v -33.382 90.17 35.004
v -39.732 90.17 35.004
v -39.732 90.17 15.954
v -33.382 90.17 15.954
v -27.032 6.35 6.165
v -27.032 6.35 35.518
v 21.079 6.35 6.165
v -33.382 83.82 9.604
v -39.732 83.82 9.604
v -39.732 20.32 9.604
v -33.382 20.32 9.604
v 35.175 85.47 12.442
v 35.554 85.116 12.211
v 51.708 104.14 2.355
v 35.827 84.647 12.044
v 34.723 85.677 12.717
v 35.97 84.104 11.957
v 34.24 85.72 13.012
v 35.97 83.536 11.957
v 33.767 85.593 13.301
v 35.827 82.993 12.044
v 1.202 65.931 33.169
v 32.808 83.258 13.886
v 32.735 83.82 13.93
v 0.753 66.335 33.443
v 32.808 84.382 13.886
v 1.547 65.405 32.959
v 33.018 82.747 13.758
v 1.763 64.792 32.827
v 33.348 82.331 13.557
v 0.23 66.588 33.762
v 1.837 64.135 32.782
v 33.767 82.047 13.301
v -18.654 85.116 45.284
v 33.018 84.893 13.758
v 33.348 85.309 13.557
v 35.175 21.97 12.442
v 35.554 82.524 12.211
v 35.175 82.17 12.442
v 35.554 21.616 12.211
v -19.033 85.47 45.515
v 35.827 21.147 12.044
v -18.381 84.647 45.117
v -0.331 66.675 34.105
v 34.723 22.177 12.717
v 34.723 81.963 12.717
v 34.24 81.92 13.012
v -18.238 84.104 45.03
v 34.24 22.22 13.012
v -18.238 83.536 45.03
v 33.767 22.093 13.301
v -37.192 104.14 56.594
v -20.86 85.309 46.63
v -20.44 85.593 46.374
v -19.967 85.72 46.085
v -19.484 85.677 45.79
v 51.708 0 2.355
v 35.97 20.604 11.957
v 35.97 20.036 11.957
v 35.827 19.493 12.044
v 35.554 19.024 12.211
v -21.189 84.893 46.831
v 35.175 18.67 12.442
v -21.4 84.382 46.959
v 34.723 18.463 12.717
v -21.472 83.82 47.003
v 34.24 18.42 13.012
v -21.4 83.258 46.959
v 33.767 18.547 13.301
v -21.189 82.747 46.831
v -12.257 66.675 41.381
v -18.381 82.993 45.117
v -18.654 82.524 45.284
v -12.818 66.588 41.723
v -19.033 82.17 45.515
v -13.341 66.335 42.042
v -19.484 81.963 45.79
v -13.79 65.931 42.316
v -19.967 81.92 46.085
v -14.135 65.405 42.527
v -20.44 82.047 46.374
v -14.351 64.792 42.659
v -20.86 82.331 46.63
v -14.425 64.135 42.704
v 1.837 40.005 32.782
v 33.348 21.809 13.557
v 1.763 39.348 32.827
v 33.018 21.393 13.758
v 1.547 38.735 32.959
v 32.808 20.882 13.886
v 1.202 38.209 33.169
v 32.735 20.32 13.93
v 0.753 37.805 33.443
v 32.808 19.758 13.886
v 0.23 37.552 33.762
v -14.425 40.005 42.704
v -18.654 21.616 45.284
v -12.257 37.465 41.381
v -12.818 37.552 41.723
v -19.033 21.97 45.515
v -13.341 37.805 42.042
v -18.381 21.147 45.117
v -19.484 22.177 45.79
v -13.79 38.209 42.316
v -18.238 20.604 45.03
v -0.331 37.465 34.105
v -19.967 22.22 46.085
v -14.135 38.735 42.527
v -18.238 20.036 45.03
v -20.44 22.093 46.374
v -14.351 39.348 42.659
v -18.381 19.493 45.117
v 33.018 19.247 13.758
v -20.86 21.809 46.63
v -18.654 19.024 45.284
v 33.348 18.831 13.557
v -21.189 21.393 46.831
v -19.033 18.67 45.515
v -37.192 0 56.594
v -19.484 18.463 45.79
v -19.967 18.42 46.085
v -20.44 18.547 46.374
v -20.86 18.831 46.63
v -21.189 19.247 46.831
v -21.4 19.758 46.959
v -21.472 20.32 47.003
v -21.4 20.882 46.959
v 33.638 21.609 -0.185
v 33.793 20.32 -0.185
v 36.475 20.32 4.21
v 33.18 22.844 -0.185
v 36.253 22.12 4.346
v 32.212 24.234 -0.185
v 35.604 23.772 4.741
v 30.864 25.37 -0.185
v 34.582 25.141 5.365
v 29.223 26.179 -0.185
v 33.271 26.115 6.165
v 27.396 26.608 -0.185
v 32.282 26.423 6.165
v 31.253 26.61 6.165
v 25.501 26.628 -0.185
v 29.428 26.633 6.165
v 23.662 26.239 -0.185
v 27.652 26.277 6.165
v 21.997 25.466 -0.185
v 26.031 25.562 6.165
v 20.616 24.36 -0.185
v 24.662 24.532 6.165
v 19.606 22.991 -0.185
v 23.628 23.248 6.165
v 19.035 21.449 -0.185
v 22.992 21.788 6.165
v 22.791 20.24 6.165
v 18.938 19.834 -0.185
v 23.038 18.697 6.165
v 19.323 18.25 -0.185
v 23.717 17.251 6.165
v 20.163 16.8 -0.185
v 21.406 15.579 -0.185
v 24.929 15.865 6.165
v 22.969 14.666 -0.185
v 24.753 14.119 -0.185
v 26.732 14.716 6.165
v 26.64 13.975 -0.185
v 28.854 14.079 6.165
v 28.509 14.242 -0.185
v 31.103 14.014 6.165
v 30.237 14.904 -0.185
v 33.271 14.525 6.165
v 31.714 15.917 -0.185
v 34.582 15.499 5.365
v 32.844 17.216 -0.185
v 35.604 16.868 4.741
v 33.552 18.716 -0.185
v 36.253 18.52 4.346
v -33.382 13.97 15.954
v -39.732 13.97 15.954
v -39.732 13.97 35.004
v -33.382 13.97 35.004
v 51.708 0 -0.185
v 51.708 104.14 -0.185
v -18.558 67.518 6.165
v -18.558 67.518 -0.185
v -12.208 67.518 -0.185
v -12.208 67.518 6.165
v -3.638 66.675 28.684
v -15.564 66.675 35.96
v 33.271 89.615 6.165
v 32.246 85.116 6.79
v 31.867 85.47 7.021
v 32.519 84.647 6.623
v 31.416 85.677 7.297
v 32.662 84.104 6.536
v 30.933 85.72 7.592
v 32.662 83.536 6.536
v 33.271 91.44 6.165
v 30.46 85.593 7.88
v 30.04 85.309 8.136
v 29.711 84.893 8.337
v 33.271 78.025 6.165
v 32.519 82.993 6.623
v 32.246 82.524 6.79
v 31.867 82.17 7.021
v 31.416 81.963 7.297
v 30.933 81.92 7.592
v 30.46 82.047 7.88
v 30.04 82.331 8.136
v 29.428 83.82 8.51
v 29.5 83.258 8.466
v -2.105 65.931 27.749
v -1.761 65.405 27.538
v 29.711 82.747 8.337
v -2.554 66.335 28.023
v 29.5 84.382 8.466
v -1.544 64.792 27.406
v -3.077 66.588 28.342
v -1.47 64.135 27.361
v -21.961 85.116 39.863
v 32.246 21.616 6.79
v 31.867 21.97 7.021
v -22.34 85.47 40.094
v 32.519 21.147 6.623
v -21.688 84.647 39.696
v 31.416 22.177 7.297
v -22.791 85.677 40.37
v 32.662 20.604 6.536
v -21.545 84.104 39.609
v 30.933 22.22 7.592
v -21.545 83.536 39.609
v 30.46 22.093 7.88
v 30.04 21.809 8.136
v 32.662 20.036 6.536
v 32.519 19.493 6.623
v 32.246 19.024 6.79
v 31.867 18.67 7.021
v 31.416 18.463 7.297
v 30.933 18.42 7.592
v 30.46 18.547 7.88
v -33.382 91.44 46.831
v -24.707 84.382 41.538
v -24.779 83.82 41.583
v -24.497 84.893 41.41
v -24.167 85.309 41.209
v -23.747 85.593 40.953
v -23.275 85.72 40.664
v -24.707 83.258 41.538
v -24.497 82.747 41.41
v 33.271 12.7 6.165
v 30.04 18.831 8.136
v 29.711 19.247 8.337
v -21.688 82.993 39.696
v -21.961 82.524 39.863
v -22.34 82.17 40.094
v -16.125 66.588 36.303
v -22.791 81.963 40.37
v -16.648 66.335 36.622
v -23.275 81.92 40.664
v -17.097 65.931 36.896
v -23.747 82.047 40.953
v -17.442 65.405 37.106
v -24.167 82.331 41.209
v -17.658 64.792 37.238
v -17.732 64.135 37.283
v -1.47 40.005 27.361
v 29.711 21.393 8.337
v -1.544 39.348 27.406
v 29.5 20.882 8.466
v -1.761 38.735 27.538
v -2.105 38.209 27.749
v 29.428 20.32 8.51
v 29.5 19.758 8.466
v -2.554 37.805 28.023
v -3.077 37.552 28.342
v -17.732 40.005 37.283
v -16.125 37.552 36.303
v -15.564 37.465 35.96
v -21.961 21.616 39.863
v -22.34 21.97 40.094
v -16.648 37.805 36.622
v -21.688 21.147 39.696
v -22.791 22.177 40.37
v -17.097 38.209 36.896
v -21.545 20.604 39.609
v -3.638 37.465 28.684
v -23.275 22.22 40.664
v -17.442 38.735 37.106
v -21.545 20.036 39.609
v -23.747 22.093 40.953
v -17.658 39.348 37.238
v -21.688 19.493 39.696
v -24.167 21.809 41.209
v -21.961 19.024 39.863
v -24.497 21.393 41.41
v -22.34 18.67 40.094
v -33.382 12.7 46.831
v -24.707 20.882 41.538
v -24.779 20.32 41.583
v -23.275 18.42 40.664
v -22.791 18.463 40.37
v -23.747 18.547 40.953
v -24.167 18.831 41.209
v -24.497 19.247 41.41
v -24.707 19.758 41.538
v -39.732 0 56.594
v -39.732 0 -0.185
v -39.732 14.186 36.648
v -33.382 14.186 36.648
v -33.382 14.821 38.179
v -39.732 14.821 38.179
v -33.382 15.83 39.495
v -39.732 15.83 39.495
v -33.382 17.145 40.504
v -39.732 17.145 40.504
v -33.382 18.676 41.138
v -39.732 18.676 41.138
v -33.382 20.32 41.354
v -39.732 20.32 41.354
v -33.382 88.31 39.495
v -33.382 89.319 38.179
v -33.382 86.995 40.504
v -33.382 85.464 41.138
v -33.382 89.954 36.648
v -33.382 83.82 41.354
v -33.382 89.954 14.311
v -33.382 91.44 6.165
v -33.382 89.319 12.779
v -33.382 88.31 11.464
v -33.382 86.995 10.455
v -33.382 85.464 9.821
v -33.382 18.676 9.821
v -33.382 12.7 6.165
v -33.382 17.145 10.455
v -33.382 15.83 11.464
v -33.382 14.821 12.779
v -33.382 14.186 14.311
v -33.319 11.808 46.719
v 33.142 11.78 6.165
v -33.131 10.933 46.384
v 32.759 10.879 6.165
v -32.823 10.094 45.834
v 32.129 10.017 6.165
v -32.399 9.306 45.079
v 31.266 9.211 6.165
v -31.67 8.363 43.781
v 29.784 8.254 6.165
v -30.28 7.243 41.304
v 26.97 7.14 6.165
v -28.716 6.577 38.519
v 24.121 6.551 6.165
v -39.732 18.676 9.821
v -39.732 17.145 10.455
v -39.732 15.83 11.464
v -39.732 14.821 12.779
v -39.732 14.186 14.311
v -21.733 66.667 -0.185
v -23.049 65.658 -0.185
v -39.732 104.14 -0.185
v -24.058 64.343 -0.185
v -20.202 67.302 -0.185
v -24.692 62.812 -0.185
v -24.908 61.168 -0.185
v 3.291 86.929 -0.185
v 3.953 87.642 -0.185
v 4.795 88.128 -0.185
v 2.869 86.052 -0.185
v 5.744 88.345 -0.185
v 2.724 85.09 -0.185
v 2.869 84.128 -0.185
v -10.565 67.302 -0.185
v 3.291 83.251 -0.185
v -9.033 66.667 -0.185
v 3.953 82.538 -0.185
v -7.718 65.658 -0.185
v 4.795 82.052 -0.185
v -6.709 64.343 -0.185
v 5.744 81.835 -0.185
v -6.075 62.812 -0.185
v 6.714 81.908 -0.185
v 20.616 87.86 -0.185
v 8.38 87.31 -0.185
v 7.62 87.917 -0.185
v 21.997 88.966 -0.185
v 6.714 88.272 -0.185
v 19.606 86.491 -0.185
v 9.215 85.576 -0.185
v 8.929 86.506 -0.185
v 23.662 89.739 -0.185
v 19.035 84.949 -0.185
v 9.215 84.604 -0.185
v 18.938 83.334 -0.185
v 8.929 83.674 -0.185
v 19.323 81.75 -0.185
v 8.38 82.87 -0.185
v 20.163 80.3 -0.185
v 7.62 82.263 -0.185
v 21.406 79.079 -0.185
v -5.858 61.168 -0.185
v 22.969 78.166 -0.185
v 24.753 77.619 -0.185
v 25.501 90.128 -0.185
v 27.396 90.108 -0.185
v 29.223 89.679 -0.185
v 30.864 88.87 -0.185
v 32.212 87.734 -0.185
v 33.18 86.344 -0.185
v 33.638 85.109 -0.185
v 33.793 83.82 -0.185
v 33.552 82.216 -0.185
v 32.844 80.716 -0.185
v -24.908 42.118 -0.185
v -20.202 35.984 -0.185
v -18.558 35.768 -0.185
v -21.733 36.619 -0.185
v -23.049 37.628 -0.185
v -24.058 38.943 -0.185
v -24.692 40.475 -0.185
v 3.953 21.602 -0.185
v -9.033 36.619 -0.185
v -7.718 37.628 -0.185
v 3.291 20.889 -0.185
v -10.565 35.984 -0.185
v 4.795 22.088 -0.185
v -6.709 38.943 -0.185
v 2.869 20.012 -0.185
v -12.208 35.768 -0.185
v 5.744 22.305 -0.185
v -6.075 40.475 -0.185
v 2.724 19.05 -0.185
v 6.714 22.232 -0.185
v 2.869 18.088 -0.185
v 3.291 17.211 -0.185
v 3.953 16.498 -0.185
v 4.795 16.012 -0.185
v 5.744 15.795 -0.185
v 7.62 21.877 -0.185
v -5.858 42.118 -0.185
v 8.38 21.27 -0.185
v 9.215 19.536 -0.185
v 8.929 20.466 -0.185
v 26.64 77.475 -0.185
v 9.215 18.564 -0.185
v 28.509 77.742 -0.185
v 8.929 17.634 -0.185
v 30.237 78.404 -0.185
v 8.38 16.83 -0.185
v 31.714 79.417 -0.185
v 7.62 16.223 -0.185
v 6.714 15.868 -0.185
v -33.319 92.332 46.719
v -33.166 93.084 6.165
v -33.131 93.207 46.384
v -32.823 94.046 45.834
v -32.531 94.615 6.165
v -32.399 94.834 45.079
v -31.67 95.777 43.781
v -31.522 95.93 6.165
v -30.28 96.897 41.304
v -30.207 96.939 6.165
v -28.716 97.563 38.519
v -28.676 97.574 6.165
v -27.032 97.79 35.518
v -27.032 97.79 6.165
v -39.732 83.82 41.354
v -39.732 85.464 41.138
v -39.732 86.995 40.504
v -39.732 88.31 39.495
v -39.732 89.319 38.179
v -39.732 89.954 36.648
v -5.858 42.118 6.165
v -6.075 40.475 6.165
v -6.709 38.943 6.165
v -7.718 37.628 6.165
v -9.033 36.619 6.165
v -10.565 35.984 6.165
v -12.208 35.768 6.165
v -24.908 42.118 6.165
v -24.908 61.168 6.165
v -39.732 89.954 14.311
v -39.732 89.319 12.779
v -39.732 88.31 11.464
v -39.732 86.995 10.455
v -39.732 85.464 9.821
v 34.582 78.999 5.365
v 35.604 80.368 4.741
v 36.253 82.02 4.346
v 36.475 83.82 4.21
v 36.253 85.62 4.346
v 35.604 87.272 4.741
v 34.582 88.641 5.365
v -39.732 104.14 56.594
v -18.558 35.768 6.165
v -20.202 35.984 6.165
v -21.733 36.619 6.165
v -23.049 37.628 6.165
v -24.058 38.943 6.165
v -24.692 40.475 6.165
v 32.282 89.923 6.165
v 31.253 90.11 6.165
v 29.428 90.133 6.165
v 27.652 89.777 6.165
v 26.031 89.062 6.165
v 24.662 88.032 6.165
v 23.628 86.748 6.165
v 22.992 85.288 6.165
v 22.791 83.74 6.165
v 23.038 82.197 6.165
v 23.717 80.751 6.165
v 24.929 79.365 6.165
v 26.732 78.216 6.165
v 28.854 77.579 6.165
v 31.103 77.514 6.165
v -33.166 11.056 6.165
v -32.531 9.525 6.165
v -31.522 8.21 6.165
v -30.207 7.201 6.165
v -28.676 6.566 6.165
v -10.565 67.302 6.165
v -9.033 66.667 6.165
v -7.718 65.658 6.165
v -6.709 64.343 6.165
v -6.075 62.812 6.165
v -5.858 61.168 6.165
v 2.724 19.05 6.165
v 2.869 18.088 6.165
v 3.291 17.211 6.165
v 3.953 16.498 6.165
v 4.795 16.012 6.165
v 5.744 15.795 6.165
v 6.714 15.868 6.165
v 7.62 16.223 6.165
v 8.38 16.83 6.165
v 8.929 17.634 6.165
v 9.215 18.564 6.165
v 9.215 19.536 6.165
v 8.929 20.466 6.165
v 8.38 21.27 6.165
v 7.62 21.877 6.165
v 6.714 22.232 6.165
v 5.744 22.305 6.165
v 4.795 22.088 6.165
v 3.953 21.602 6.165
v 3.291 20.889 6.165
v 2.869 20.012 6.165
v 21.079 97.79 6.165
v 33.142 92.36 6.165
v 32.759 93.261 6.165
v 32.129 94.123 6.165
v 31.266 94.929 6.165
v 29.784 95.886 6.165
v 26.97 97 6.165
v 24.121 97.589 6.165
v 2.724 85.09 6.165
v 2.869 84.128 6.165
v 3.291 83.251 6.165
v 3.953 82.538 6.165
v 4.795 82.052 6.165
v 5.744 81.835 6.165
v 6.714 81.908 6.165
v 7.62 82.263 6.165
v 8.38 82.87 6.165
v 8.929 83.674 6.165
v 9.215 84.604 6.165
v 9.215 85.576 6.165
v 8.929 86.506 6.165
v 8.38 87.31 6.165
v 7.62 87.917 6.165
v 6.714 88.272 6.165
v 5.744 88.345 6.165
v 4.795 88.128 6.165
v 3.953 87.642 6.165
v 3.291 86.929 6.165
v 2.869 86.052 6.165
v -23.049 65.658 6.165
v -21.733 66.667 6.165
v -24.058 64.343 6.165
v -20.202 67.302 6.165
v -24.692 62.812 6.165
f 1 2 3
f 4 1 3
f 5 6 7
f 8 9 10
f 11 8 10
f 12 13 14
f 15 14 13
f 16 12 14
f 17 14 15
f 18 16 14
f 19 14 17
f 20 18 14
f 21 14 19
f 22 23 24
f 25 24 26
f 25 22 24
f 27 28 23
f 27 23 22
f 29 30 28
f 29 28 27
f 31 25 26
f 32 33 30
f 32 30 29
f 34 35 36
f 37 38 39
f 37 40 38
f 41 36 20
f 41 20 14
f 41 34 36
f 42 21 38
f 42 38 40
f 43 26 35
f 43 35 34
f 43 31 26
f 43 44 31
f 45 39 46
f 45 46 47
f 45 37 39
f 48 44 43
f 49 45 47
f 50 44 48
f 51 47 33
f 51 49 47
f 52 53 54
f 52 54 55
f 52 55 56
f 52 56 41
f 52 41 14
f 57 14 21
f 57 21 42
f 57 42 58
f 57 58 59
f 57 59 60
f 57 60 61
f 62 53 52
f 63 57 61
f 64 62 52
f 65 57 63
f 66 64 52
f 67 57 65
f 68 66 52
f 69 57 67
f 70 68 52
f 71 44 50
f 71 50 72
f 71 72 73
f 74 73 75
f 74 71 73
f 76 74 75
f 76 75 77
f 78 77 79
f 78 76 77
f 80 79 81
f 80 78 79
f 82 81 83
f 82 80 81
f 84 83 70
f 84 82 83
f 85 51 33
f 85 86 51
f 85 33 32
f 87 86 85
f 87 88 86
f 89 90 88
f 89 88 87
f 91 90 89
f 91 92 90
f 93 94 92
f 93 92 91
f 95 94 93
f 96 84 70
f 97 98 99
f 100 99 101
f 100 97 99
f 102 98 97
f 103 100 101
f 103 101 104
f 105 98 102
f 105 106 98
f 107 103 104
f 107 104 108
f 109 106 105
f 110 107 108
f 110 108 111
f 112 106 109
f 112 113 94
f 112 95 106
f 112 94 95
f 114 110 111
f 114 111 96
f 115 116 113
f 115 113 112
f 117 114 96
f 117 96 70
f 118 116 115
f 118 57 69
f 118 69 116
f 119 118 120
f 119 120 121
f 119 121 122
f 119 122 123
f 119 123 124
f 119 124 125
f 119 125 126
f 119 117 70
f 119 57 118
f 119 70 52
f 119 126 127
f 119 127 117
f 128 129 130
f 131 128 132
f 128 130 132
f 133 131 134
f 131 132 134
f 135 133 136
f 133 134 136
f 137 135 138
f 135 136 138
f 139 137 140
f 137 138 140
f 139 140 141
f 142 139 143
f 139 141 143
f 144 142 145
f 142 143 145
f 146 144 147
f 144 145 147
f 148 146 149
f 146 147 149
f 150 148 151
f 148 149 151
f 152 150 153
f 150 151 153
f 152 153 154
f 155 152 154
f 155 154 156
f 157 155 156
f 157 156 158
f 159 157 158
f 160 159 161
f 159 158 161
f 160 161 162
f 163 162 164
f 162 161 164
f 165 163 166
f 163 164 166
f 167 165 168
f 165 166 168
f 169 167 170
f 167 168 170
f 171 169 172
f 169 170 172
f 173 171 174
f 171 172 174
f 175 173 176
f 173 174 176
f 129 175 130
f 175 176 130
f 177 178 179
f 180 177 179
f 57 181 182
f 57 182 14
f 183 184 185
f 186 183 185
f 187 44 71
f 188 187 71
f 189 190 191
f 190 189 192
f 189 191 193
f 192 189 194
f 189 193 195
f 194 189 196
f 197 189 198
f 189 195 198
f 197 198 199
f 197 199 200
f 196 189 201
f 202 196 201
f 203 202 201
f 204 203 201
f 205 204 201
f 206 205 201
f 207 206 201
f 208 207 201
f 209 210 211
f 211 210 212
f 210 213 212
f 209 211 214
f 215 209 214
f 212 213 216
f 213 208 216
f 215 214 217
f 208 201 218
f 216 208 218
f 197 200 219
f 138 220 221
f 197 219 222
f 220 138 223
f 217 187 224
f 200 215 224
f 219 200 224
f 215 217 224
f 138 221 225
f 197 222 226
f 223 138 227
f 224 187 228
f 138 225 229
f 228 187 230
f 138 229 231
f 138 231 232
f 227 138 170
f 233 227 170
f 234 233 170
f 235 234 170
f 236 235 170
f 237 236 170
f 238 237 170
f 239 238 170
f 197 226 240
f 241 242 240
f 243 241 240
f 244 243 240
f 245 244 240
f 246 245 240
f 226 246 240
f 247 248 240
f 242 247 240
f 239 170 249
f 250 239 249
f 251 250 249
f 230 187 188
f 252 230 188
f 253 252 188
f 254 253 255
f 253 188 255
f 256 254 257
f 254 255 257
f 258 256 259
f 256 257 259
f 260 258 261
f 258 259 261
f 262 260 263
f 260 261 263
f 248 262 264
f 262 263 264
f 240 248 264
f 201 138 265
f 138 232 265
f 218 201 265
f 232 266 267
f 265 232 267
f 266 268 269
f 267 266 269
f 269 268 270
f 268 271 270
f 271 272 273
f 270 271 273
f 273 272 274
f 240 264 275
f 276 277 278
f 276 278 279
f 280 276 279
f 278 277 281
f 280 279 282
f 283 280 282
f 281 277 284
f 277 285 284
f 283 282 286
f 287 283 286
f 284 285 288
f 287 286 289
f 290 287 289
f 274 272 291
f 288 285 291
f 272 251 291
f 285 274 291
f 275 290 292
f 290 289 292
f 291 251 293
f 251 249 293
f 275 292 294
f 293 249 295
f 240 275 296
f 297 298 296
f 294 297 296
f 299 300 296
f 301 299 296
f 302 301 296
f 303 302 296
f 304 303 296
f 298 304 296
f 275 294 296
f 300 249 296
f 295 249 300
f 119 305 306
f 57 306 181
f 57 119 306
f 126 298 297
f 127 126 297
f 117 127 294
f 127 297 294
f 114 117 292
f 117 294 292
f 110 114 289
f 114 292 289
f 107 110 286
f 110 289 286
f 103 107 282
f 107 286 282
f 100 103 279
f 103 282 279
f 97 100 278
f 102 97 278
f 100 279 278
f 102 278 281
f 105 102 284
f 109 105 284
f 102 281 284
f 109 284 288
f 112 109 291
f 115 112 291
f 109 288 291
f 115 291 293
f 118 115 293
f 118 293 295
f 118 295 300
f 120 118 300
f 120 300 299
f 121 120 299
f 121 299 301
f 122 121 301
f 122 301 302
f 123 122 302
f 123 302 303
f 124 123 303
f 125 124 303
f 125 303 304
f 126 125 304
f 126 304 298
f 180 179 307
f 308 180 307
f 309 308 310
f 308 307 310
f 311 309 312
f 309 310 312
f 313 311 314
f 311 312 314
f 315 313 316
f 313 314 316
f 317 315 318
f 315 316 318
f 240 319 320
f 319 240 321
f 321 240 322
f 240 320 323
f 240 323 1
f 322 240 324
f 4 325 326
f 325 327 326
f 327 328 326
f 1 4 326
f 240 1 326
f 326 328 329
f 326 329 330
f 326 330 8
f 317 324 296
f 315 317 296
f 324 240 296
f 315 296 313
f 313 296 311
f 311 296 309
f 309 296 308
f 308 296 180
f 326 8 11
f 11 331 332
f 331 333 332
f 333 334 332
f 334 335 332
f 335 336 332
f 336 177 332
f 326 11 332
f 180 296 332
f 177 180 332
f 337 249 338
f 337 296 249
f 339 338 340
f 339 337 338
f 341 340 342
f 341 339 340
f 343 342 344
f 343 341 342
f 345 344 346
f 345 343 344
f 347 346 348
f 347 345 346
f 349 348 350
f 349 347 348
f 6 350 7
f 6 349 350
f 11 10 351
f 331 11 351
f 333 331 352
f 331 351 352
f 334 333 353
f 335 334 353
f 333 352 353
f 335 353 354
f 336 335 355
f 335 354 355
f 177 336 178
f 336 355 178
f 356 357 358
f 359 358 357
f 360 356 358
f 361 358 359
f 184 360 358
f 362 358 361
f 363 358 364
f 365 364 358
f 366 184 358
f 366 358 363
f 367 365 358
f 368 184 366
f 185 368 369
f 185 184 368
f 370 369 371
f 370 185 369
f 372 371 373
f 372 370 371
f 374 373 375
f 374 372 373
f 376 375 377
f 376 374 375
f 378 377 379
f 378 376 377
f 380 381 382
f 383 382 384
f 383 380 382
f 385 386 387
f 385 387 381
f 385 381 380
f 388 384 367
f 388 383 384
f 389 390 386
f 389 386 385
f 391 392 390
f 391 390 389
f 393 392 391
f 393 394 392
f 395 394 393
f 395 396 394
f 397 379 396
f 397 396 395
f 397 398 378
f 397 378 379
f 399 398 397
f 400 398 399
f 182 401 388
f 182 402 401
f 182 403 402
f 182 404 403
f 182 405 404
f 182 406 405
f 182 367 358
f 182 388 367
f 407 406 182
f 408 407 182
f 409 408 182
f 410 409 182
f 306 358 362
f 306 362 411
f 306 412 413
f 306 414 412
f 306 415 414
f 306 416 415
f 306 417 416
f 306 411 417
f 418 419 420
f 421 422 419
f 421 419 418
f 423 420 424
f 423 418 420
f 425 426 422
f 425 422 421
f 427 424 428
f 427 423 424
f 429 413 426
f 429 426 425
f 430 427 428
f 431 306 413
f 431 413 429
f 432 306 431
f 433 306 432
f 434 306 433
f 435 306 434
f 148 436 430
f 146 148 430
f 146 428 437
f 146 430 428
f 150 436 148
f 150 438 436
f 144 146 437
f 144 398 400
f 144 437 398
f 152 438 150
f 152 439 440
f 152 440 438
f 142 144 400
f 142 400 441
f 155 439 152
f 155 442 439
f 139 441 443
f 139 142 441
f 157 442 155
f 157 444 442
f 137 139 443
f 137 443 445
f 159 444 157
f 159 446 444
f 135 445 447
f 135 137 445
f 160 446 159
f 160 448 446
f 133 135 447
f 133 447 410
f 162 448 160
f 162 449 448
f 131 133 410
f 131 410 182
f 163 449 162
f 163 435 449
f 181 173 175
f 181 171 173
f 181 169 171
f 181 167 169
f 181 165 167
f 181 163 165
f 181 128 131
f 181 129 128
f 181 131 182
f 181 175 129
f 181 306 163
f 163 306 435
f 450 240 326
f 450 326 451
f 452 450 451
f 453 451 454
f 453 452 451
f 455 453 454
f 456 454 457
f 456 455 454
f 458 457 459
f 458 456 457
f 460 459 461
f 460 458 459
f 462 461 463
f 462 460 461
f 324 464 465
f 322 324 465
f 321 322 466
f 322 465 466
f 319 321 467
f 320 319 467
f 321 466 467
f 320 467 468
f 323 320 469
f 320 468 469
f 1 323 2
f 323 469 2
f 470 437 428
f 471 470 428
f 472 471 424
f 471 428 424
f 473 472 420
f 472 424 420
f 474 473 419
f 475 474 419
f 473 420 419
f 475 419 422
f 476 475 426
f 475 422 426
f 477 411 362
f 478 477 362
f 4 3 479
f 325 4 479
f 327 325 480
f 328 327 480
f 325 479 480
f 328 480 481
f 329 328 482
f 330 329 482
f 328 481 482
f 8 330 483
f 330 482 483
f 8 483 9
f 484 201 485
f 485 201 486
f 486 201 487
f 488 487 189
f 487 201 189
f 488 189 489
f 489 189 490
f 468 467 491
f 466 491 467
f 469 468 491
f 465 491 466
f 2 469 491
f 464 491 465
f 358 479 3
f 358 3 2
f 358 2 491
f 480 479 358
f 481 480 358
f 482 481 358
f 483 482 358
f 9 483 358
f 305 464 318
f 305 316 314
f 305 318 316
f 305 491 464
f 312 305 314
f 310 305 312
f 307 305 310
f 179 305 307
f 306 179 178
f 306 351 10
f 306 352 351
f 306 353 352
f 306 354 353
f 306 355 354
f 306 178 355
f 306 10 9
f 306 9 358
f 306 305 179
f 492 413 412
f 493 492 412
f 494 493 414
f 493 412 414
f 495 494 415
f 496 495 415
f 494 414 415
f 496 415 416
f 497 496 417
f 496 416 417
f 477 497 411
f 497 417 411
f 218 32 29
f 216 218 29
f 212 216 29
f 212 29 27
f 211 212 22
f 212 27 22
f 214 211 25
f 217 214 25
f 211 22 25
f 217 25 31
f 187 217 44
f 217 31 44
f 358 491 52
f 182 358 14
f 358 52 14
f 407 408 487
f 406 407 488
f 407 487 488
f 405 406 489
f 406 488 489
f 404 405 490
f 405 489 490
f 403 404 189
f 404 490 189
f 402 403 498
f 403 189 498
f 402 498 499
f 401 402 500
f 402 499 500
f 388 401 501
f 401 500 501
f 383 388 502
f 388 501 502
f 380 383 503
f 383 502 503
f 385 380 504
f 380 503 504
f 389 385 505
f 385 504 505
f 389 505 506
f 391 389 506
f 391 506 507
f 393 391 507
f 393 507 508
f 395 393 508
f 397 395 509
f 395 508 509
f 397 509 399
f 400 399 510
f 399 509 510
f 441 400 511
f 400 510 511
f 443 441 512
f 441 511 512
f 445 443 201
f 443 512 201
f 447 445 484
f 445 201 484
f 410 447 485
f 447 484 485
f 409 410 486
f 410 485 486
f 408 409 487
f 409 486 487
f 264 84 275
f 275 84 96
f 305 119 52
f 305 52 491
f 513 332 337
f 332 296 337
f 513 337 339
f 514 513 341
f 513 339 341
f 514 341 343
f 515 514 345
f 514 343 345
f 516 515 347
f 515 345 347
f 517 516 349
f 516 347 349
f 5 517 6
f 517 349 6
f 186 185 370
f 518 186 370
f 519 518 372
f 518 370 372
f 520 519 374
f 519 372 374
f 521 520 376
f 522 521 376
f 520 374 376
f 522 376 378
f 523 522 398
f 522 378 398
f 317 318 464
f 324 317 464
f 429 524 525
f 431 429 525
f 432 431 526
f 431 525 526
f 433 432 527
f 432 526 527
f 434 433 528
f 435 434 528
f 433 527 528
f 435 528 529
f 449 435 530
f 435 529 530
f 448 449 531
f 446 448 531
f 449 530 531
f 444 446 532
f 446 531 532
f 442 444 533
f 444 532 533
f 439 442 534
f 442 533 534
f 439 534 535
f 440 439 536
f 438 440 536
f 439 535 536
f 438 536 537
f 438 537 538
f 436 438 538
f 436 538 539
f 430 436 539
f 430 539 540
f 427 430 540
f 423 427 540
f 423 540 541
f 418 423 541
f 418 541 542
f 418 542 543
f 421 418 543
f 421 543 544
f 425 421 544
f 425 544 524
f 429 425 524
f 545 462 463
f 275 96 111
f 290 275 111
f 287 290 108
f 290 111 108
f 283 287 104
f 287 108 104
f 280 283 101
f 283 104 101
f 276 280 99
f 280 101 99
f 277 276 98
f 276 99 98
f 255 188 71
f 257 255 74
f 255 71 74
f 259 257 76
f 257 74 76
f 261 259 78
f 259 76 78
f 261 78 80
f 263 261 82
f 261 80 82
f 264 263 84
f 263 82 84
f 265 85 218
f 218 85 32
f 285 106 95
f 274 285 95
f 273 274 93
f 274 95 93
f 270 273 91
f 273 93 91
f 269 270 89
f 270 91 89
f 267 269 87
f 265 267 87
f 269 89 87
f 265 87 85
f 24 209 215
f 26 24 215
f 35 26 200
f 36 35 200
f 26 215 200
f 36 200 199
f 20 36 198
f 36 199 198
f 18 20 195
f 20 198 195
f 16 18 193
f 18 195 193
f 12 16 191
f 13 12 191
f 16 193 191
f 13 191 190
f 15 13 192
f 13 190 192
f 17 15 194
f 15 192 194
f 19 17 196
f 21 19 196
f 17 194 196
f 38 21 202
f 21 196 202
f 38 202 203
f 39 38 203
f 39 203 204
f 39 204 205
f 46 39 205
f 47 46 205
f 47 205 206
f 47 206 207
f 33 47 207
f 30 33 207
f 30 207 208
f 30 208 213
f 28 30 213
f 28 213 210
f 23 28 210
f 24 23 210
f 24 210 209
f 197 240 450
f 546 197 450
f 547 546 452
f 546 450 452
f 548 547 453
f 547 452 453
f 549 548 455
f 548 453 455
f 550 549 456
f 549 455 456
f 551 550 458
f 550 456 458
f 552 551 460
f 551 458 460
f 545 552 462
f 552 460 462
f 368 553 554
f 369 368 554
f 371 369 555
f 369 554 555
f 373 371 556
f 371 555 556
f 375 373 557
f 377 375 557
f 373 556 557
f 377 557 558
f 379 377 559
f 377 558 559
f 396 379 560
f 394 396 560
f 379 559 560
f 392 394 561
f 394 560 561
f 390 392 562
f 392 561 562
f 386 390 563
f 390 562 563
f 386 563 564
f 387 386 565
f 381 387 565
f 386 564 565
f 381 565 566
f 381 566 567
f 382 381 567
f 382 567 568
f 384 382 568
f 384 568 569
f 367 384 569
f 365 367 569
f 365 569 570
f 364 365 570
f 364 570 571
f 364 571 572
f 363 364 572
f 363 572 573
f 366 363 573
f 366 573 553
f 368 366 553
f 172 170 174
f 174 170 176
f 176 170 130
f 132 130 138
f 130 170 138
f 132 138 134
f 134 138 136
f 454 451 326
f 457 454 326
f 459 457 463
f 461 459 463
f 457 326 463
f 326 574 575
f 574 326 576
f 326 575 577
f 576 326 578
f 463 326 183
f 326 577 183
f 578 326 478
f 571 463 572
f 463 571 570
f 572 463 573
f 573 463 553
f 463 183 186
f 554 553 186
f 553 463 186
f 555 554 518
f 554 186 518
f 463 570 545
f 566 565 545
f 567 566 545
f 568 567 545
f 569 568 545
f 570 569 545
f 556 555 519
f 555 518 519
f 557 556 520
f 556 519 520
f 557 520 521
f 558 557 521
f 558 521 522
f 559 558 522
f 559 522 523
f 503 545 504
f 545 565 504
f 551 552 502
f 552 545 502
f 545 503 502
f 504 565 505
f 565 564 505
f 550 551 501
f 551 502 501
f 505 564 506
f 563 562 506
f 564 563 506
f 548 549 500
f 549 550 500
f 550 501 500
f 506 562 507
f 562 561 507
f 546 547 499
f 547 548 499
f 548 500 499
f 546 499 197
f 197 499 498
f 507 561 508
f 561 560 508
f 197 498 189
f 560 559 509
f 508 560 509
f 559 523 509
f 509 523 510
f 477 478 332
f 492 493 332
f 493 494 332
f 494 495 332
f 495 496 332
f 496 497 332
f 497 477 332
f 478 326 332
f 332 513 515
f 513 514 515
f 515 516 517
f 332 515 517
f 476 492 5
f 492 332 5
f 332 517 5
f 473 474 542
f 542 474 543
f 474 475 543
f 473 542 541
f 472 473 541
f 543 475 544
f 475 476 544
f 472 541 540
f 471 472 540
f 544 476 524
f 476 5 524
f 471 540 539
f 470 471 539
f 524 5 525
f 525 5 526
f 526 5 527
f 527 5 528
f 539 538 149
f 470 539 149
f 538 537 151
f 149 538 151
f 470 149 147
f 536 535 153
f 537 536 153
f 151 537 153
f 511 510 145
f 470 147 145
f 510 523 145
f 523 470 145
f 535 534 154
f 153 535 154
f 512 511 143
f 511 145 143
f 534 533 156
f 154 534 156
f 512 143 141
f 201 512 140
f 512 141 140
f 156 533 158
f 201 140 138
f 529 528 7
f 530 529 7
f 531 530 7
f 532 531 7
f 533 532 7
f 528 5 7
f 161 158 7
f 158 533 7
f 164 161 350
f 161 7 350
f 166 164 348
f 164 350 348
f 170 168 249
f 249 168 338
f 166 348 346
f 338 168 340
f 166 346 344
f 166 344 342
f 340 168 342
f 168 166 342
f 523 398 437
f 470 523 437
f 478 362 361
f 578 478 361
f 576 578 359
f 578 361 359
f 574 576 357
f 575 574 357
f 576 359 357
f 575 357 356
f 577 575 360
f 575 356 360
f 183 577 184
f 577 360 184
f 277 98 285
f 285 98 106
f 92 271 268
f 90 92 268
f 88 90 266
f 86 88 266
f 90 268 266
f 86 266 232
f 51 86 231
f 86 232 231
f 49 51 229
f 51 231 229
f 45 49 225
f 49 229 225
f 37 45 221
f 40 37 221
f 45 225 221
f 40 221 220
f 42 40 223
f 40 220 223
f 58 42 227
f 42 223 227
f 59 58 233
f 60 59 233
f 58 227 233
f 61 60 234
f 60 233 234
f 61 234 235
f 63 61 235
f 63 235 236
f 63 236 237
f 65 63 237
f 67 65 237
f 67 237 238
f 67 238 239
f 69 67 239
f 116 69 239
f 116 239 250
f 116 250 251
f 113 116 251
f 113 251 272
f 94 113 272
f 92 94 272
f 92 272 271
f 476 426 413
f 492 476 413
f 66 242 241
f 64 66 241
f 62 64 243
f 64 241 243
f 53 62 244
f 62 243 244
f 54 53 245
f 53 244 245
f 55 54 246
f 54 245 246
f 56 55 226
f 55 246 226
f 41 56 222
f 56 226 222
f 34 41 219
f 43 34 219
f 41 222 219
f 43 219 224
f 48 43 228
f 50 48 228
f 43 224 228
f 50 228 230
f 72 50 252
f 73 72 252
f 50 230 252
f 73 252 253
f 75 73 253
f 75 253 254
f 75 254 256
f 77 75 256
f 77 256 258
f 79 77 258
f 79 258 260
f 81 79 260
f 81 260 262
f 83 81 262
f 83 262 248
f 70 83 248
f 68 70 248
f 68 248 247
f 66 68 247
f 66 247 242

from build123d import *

# Parameters (mm, degrees)
F1_DEPTH  = 104.14
F2_T      = -6.35
F4_D      = 3.81
F4_DEPTH  = 6.604
F4_TIP    = 1.1446394792
F6_DEPTH  = 12.7
F8_DEPTH  = 12.7
F9_R      = 6.35
F10_START = -6.35
F3_R      = 6.35
F10_DEPTH = 19.05
F12_DEPTH = 6.35
F13_D     = 6.5278
F13_DEPTH = 6.604
F13_TIP   = 1.9611489744


with BuildPart() as f1:
    # F0 (on Front) → F1 (new body)
    with BuildSketch(Plane.XZ):
        Polygon((-37.1921509504, 56.5943730235), (-39.7321509504, 56.5943730235), (-39.7321509504, -0.1851844968), (51.7078490496, -0.1851844968), (51.7078490496, 2.3548155032), align=None)
    extrude(amount=-F1_DEPTH)

    # F2 (hollow: no face is removed)
    offset(amount=F2_T, mode=Mode.SUBTRACT)

    # F4
    with Locations(Plane(origin=(15.0736214303, 0, 24.7060449314), x_dir=(0.8536585366, 0, -0.5208330855), z_dir=(0.5208330855, 0, 0.8536585366))):
        with Locations((-40.9056190746, 20.32), (-40.9056190746, 83.82), (22.5943809254, 83.82), (22.5943809254, 20.32)):
            Hole(F4_D / 2, depth=F4_DEPTH)
            with Locations((0, 0, -(F4_DEPTH + F4_TIP / 2))):  # 118° drill point
                Cone(0, F4_D / 2, F4_TIP, mode=Mode.SUBTRACT)

    # F5 (on face) → F6 (cut)
    with BuildSketch(Plane(origin=(15.0736214303, 0, 24.7060449314), x_dir=(0.8536585366, 0, -0.5208330855), z_dir=(0.5208330855, 0, 0.8536585366))):
        with BuildLine():
            ThreePointArc((-34.5556190746, 40.005), (-33.8116702988, 38.2089487758), (-32.0156190746, 37.465))
            Line((-32.0156190746, 37.465), (-18.0456190746, 37.465))
            ThreePointArc((-18.0456190746, 37.465), (-16.2495678504, 38.2089487758), (-15.5056190746, 40.005))
            Line((-15.5056190746, 40.005), (-15.5056190746, 64.135))
            ThreePointArc((-15.5056190746, 64.135), (-16.2495678504, 65.9310512242), (-18.0456190746, 66.675))
            Line((-18.0456190746, 66.675), (-32.0156190746, 66.675))
            ThreePointArc((-32.0156190746, 66.675), (-33.8116702988, 65.9310512242), (-34.5556190746, 64.135))
            Line((-34.5556190746, 64.135), (-34.5556190746, 40.005))
        make_face()
    extrude(amount=-F6_DEPTH, mode=Mode.SUBTRACT)

    # F7 (on face) → F8 (cut)
    with BuildSketch(Plane(origin=(-39.7321509504, 0, 0), x_dir=(0, -1, 0), z_dir=(-1, 0, 0))):
        with BuildLine():
            Line((-20.32, 41.3543730235), (-83.82, 41.3543730235))
            ThreePointArc((-83.82, 41.3543730235), (-88.3101280605, 39.494501084), (-90.17, 35.0043730235))
            Line((-90.17, 35.0043730235), (-90.17, 15.9543730235))
            ThreePointArc((-90.17, 15.9543730235), (-88.3101280605, 11.464244963), (-83.82, 9.6043730235))
            Line((-83.82, 9.6043730235), (-20.32, 9.6043730235))
            ThreePointArc((-20.32, 9.6043730235), (-15.8298719395, 11.464244963), (-13.97, 15.9543730235))
            Line((-13.97, 15.9543730235), (-13.97, 35.0043730235))
            ThreePointArc((-13.97, 35.0043730235), (-15.8298719395, 39.494501084), (-20.32, 41.3543730235))
        make_face()
    extrude(amount=-F8_DEPTH, mode=Mode.SUBTRACT)

    # F9
    f9_edges = [f1.edges().sort_by_distance(p)[0] for p in [
        (-0.055497, 6.35, 26.498032),
        (-0.055497, 97.79, 26.498032),
        (-33.382151, 6.35, 26.498032),
        (-33.382151, 97.79, 26.498032),
    ]]
    fillet(f9_edges, radius=F9_R)

    # F3 (on face) → F10 (cut)
    with BuildSketch(Plane(origin=(15.0736214303, 0, 24.7060449314), x_dir=(0.8536585366, 0, -0.5208330855), z_dir=(0.5208330855, 0, 0.8536585366)).offset(F10_START)):
        with Locations((22.5943809254, 83.82)):
            Circle(F3_R)
        with Locations((22.5943809254, 20.32)):
            Circle(F3_R)
    extrude(amount=-F10_DEPTH, mode=Mode.SUBTRACT)

    # F11 (on face) → F12 (cut)
    with BuildSketch(Plane(origin=(0, 0, -0.1851844968), x_dir=(1, 0, 0), z_dir=(0, 0, -1))):
        with BuildLine():
            ThreePointArc((-5.858374995, -42.1181075931), (-7.7182469345, -37.6279795325), (-12.208374995, -35.7681075931))
            Line((-12.208374995, -35.7681075931), (-18.558374995, -35.7681075931))
            ThreePointArc((-18.558374995, -35.7681075931), (-23.0485030555, -37.6279795325), (-24.908374995, -42.1181075931))
            Line((-24.908374995, -42.1181075931), (-24.908374995, -61.1681075931))
            ThreePointArc((-24.908374995, -61.1681075931), (-23.0485030555, -65.6582356536), (-18.558374995, -67.5181075931))
            Line((-18.558374995, -67.5181075931), (-12.208374995, -67.5181075931))
            ThreePointArc((-12.208374995, -67.5181075931), (-7.7182469345, -65.6582356536), (-5.858374995, -61.1681075931))
            Line((-5.858374995, -61.1681075931), (-5.858374995, -42.1181075931))
        make_face()
    extrude(amount=-F12_DEPTH, mode=Mode.SUBTRACT)

    # F13
    with Locations(Plane(origin=(0, 0, -0.1851844968), x_dir=(1, 0, 0), z_dir=(0, 0, -1))):
        with Locations((5.9878490496, -19.05), (5.9878490496, -85.09)):
            Hole(F13_D / 2, depth=F13_DEPTH)
            with Locations((0, 0, -(F13_DEPTH + F13_TIP / 2))):  # 118° drill point
                Cone(0, F13_D / 2, F13_TIP, mode=Mode.SUBTRACT)


solid = f1.part
